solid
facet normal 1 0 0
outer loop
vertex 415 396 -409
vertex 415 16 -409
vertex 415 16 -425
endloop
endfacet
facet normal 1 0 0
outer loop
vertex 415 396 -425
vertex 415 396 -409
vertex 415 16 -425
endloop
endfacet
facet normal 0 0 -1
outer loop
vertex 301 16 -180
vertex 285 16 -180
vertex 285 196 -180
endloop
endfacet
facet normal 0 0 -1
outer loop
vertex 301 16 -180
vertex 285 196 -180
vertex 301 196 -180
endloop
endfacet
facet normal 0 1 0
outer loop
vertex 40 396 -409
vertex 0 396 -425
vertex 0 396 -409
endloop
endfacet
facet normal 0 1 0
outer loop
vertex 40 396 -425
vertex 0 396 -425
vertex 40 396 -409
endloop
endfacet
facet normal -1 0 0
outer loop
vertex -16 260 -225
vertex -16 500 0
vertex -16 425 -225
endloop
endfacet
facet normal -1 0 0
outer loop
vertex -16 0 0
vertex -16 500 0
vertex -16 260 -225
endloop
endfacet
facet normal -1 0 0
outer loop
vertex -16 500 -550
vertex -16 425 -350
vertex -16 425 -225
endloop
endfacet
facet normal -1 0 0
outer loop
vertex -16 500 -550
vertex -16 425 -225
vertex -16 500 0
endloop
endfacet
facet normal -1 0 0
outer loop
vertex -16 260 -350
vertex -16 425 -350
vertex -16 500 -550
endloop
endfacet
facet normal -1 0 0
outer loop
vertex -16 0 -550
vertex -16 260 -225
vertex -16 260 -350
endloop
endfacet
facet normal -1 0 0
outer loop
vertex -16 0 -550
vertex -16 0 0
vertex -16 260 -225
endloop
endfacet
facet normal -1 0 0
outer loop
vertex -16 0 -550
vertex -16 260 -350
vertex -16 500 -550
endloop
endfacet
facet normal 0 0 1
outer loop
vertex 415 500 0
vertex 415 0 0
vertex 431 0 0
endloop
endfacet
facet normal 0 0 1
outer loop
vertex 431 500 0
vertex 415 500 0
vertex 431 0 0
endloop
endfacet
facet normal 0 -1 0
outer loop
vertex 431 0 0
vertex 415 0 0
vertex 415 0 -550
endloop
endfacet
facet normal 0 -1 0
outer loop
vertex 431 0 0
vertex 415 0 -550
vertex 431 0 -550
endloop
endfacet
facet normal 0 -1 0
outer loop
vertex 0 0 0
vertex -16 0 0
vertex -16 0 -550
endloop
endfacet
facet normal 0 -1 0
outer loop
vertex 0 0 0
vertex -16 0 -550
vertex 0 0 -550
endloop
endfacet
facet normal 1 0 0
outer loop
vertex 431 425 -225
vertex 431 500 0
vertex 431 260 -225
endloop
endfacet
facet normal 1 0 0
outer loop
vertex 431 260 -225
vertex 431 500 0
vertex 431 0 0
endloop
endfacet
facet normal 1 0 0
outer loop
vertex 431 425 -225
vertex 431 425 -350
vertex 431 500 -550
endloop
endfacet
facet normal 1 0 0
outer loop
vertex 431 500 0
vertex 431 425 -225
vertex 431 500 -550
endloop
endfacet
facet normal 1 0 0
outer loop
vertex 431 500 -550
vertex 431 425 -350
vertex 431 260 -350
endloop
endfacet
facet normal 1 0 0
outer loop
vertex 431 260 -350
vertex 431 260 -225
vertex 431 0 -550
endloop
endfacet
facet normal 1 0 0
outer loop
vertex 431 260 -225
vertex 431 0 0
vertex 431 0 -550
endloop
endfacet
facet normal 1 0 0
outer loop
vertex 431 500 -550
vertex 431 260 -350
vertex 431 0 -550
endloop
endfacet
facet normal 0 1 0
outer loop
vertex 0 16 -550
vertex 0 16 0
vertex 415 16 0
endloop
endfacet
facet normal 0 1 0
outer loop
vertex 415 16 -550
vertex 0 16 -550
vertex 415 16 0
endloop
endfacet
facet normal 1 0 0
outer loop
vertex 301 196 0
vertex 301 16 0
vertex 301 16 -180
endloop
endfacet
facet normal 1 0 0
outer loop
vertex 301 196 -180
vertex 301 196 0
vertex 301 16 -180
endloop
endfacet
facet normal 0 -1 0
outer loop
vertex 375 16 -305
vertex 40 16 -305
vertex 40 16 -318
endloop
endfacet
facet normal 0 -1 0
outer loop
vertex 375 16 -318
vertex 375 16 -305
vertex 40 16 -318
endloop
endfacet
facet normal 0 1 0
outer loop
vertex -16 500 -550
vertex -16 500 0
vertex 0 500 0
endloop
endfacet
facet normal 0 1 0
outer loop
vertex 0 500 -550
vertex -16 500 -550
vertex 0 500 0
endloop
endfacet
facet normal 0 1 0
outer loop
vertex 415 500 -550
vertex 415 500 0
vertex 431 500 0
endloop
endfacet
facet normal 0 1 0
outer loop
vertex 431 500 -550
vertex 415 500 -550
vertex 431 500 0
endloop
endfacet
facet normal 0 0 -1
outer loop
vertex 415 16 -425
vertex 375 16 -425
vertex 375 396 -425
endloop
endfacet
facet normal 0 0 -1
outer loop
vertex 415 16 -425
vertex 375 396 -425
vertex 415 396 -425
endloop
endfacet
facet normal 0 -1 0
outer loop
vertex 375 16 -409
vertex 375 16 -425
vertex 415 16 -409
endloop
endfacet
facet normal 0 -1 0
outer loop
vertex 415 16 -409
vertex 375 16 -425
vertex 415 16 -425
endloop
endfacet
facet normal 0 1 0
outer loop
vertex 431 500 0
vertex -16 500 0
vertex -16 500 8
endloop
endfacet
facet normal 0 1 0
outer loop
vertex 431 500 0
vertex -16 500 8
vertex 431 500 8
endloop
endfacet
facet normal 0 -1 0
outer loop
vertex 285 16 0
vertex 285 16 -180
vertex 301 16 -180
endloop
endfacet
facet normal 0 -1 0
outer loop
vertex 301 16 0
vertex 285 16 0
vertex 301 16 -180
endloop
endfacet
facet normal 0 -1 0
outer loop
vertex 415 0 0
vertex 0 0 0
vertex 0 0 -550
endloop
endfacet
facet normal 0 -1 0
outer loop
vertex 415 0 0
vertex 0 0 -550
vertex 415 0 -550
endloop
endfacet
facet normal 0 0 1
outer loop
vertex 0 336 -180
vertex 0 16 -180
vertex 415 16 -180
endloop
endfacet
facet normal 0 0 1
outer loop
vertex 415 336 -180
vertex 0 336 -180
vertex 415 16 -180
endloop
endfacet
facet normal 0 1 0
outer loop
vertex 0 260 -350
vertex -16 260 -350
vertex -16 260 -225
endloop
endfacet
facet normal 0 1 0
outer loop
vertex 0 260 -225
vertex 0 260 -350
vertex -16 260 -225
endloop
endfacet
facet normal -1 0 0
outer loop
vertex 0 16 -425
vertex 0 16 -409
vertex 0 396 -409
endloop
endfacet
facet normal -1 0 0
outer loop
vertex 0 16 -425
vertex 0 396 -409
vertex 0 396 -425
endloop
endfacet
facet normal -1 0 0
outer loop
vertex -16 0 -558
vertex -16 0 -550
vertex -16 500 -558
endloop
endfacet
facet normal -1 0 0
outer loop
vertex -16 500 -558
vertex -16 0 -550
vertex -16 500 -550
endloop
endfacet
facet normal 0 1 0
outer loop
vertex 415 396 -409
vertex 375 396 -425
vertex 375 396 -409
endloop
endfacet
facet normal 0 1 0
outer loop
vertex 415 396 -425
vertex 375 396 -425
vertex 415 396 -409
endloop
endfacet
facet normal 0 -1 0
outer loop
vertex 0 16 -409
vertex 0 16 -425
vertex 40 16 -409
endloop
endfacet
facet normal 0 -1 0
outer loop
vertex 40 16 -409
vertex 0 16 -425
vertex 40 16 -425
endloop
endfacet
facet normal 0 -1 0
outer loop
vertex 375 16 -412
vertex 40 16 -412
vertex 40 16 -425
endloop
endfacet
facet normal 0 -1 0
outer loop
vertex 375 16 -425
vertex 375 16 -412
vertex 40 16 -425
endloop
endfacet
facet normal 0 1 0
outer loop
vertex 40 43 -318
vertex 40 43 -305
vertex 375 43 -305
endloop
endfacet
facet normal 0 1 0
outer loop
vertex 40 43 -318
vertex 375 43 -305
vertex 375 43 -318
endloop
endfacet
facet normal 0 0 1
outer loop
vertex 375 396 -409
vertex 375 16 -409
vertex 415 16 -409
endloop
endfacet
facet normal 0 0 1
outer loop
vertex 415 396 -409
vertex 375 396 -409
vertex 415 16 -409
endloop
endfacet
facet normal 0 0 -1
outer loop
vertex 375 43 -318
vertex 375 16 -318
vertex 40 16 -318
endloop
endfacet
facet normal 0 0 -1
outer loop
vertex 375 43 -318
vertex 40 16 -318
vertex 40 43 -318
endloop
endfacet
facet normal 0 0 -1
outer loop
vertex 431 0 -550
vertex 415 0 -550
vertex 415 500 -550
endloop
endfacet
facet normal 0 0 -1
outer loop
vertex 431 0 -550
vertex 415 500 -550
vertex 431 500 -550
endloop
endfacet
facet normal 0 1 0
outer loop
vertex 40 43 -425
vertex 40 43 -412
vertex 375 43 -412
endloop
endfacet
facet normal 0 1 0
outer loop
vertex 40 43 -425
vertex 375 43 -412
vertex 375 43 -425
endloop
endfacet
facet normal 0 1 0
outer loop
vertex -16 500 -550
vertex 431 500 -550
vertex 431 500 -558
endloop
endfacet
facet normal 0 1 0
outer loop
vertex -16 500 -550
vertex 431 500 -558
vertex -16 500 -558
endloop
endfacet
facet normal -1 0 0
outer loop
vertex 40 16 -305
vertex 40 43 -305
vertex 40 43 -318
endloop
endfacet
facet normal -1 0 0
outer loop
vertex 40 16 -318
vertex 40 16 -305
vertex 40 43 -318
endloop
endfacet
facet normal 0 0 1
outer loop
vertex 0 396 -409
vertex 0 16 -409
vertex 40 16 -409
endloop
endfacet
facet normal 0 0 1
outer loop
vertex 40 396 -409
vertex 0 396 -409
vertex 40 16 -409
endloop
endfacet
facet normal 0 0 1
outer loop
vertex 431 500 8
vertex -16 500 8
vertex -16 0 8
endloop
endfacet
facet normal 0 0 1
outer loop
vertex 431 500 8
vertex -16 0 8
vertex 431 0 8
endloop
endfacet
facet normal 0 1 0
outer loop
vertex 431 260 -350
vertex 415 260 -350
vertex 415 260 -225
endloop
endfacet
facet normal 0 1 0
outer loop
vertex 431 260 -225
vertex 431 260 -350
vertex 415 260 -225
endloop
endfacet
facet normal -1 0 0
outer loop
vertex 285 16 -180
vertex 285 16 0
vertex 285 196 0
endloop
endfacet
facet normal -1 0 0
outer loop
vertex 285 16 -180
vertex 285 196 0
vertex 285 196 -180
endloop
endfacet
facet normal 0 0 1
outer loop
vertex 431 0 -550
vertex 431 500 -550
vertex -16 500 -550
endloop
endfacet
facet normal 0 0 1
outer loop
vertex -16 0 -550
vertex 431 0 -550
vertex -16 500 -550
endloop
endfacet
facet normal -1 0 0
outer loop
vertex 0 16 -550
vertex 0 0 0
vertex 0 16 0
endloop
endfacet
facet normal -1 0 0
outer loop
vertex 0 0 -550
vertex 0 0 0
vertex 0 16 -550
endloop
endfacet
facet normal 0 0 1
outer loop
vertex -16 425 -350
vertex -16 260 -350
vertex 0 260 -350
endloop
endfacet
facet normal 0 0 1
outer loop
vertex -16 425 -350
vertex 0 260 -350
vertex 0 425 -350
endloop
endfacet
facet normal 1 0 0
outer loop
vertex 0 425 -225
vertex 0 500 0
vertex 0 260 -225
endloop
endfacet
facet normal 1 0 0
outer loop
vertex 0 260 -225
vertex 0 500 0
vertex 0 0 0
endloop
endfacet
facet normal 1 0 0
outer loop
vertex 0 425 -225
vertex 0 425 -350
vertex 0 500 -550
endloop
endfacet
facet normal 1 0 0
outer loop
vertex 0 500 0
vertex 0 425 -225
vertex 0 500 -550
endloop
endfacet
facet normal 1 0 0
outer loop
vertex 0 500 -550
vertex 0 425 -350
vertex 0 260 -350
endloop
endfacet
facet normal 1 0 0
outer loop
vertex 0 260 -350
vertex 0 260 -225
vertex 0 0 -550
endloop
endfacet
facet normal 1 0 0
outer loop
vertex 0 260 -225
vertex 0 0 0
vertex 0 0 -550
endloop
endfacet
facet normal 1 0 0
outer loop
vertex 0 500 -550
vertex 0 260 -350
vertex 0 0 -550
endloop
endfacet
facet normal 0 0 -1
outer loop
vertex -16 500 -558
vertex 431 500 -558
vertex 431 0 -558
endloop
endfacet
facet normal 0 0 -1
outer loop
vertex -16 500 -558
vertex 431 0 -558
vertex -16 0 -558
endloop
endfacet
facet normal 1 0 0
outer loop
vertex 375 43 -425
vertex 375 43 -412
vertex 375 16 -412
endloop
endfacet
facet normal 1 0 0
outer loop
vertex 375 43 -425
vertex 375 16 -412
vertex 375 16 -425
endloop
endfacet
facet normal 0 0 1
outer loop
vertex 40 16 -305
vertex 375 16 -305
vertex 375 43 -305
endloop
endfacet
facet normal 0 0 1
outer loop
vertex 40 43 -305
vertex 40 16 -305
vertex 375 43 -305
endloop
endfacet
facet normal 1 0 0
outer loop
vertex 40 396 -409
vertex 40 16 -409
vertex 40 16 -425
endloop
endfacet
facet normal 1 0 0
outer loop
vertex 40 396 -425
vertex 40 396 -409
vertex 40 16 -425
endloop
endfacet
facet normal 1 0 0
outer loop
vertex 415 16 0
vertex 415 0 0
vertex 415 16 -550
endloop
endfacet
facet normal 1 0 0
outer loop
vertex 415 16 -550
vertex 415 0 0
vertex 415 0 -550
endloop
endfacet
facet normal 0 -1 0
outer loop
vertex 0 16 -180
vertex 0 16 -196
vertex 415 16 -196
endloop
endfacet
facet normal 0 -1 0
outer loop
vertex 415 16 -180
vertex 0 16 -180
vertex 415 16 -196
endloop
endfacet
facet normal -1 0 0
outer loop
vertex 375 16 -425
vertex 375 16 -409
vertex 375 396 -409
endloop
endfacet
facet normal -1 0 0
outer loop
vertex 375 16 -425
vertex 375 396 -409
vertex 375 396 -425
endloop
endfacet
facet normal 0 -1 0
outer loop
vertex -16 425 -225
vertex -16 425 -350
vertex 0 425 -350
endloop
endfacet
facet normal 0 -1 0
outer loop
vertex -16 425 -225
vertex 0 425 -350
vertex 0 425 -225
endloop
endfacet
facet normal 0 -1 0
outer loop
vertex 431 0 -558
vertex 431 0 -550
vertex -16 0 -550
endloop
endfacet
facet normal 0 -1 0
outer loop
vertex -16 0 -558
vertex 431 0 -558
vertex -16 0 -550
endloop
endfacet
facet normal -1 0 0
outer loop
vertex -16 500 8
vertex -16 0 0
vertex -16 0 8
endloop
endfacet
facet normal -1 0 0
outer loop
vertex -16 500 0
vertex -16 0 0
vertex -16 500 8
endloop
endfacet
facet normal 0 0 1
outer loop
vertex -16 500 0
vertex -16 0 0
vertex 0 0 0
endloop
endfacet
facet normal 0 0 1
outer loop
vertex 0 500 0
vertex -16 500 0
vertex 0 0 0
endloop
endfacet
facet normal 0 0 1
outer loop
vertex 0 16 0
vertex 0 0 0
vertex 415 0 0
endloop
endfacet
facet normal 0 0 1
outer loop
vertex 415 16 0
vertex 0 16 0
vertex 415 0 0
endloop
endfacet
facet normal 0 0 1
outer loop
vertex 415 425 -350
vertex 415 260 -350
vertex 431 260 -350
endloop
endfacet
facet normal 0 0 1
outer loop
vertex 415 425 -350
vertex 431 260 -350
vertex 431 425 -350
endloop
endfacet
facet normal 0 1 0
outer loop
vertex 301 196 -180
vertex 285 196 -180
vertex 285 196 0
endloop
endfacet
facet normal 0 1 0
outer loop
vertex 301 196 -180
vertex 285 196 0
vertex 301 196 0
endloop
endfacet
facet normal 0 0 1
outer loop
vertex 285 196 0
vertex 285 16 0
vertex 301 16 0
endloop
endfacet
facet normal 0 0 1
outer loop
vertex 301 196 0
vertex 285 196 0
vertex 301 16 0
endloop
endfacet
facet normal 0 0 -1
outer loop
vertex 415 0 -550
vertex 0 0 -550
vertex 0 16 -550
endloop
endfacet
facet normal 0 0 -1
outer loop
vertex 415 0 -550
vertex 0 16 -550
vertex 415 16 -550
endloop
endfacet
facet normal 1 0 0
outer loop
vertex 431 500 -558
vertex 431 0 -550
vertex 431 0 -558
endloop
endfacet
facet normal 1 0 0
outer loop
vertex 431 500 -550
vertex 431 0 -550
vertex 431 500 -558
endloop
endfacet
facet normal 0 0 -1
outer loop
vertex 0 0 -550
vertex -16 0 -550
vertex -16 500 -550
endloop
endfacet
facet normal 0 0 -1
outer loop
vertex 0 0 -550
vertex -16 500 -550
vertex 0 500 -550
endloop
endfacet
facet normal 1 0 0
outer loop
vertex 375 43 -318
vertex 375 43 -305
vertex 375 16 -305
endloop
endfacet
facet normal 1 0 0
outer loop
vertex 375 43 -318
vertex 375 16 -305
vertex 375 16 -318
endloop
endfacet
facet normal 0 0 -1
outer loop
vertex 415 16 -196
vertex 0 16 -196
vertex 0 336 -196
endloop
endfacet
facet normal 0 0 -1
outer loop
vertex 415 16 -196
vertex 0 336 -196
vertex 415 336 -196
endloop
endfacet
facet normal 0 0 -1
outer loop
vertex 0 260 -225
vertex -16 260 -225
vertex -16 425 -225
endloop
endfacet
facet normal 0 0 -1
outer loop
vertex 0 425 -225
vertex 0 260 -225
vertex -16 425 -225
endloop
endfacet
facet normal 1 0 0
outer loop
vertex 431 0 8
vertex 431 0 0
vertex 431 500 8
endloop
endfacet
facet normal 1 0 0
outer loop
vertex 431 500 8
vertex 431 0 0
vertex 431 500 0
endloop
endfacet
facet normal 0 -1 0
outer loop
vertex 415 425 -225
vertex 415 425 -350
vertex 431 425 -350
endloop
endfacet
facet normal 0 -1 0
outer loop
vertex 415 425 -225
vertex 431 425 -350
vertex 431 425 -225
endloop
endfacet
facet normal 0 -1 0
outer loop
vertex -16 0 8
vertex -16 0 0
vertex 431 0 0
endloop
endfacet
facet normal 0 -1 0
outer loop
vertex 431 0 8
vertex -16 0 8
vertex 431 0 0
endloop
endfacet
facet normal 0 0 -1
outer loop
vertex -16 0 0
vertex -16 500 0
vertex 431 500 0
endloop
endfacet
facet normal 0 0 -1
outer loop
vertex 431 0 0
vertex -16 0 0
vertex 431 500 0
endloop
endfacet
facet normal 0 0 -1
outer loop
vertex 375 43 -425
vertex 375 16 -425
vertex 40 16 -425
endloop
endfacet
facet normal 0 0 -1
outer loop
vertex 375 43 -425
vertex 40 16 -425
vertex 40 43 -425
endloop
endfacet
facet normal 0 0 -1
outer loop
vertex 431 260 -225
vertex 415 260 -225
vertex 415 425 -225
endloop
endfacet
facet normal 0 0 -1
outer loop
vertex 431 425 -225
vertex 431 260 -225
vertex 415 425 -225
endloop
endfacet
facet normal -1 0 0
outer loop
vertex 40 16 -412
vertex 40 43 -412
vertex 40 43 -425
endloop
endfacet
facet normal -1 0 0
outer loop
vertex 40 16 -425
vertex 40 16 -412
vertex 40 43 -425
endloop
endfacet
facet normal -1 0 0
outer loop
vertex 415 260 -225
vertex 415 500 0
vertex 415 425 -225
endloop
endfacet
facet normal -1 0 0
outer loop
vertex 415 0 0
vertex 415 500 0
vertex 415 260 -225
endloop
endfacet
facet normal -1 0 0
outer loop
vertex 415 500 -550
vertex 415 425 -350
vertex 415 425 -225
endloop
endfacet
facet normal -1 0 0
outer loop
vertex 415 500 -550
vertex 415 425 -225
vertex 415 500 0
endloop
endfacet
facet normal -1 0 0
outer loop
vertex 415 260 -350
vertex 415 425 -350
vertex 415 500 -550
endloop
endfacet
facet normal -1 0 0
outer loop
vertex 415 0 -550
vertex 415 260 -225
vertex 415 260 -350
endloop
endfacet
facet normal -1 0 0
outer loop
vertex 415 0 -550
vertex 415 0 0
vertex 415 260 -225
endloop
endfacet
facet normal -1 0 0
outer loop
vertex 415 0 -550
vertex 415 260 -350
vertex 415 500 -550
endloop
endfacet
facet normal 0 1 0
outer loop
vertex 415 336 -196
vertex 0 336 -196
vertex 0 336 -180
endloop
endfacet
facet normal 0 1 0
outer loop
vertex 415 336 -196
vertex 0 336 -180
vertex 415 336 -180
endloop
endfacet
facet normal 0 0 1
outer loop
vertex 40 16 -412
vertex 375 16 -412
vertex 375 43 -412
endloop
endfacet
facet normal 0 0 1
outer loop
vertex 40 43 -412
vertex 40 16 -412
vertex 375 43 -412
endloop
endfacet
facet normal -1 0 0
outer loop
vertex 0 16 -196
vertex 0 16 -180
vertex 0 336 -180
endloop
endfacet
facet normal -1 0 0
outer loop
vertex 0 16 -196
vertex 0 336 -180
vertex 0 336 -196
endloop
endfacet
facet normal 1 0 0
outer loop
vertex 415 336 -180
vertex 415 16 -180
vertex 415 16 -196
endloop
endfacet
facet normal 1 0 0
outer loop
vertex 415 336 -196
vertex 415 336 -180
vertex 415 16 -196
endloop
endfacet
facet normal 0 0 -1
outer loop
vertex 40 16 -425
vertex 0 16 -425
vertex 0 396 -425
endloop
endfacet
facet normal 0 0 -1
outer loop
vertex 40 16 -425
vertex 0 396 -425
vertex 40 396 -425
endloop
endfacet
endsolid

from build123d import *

# Parameters (mm, degrees)
ESQUISSE1_W             = 415
ESQUISSE1_H             = 550
BOSS_EXTRU_1_DEPTH      = 16
BOSS_EXTRU_2_START      = 40
ESQUISSE2_W             = 13
ESQUISSE2_H             = 27
BOSS_EXTRU_2_DEPTH      = 335
BOSS_EXTRU_2_2_DEPTH    = 335
ESQUISSE3_W             = 16
ESQUISSE3_H             = 550
BOSS_EXTRU_3_DEPTH      = 500
BOSS_EXTRU_3_2_DEPTH    = 500
ESQUISSE4_W             = 125
ESQUISSE4_H             = 165
ENL_V_MAT_EXTRU_1_DEPTH = 868.357481088
ESQUISSE5_W             = 415
ESQUISSE5_H             = 16
BOSS_EXTRU_4_DEPTH      = 320
ESQUISSE6_W             = 447
ESQUISSE6_H             = 500
BOSS_EXTRU_5_DEPTH      = 8
ESQUISSE7_W             = 447
ESQUISSE7_H             = 500
BOSS_EXTRU_6_DEPTH      = 8
ESQUISSE9_W             = 40
ESQUISSE9_H             = 16
BOSS_EXTRU_8_DEPTH      = 380
BOSS_EXTRU_8_2_DEPTH    = 380
ESQUISSE10_W            = 16
ESQUISSE10_H            = 180
BOSS_EXTRU_9_DEPTH      = 180


with BuildPart() as part:
    # Esquisse1 → Boss.-Extru.1 (new body)
    with BuildSketch(Plane(origin=(0, 0, 0), x_dir=(1, 0, 0), z_dir=(0, 1, 0))):
        with Locations((207.5, 275)):
            Rectangle(ESQUISSE1_W, ESQUISSE1_H)
    extrude(amount=BOSS_EXTRU_1_DEPTH)


with BuildPart() as body_2:
    # Esquisse2 → Boss.-Extru.2 (new body)
    with BuildSketch(Plane(origin=(0, 0, -500), x_dir=(0, 0, -1), z_dir=(1, 0, 0)).offset(BOSS_EXTRU_2_START)):
        with Locations((-188.5, 29.5)):
            Rectangle(ESQUISSE2_W, ESQUISSE2_H)
    extrude(amount=BOSS_EXTRU_2_DEPTH)


with BuildPart() as body_3:
    # Esquisse2 → Boss.-Extru.2 2 (new body)
    with BuildSketch(Plane(origin=(0, 0, -500), x_dir=(0, 0, -1), z_dir=(1, 0, 0)).offset(BOSS_EXTRU_2_START)):
        with Locations((-81.5, 29.5)):
            Rectangle(ESQUISSE2_W, ESQUISSE2_H)
    extrude(amount=BOSS_EXTRU_2_2_DEPTH)


with BuildPart() as body_4:
    # Esquisse3 → Boss.-Extru.3 (new body)
    with BuildSketch(Plane(origin=(0, 0, 0), x_dir=(1, 0, 0), z_dir=(0, 1, 0))):
        with Locations((-8, 275)):
            Rectangle(ESQUISSE3_W, ESQUISSE3_H)
    extrude(amount=BOSS_EXTRU_3_DEPTH)


with BuildPart() as body_5:
    # Esquisse3 → Boss.-Extru.3 2 (new body)
    with BuildSketch(Plane(origin=(0, 0, 0), x_dir=(1, 0, 0), z_dir=(0, 1, 0))):
        with Locations((423, 275)):
            Rectangle(ESQUISSE3_W, ESQUISSE3_H)
    extrude(amount=BOSS_EXTRU_3_2_DEPTH)


with BuildPart() as enl_v_mat_extru_1_tool:
    # Esquisse4 → Enlèv. mat.-Extru.1 (new, through all)
    with BuildSketch(Plane.ZY.offset(16)):
        with Locations((-287.5, 342.5)):
            Rectangle(ESQUISSE4_W, ESQUISSE4_H)
    extrude(amount=-ENL_V_MAT_EXTRU_1_DEPTH)


with BuildPart() as body_4_1:
    add(body_4.part)

    # Enlèv. mat.-Extru.1: cut by enl_v_mat_extru_1_tool
    add(enl_v_mat_extru_1_tool.part, mode=Mode.SUBTRACT)


with BuildPart() as body_5_1:
    add(body_5.part)

    # Enlèv. mat.-Extru.1: cut by enl_v_mat_extru_1_tool
    add(enl_v_mat_extru_1_tool.part, mode=Mode.SUBTRACT)


with BuildPart() as body_6:
    # Esquisse5 → Boss.-Extru.4 (new body)
    with BuildSketch(Plane(origin=(0, 16, 0), x_dir=(1, 0, 0), z_dir=(0, 1, 0))):
        with Locations((207.5, 188)):
            Rectangle(ESQUISSE5_W, ESQUISSE5_H)
    extrude(amount=BOSS_EXTRU_4_DEPTH)


with BuildPart() as body_7:
    # Esquisse6 → Boss.-Extru.5 (new body)
    with BuildSketch(Plane(origin=(0, 0, -550), x_dir=(-1, 0, 0), z_dir=(0, 0, -1))):
        with Locations((-207.5, 250)):
            Rectangle(ESQUISSE6_W, ESQUISSE6_H)
    extrude(amount=BOSS_EXTRU_5_DEPTH)


with BuildPart() as body_8:
    # Esquisse7 → Boss.-Extru.6 (new body)
    with BuildSketch(Plane.XY):
        with Locations((207.5, 250)):
            Rectangle(ESQUISSE7_W, ESQUISSE7_H)
    extrude(amount=BOSS_EXTRU_6_DEPTH)


with BuildPart() as body_9:
    # Esquisse9 → Boss.-Extru.8 (new body)
    with BuildSketch(Plane(origin=(0, 16, 0), x_dir=(1, 0, 0), z_dir=(0, 1, 0))):
        with Locations((20, 417)):
            Rectangle(ESQUISSE9_W, ESQUISSE9_H)
    extrude(amount=BOSS_EXTRU_8_DEPTH)


with BuildPart() as body_10:
    # Esquisse9 → Boss.-Extru.8 2 (new body)
    with BuildSketch(Plane(origin=(0, 16, 0), x_dir=(1, 0, 0), z_dir=(0, 1, 0))):
        with Locations((395, 417)):
            Rectangle(ESQUISSE9_W, ESQUISSE9_H)
    extrude(amount=BOSS_EXTRU_8_2_DEPTH)


with BuildPart() as body_11:
    # Esquisse10 → Boss.-Extru.9 (new body)
    with BuildSketch(Plane(origin=(0, 16, 0), x_dir=(1, 0, 0), z_dir=(0, 1, 0))):
        with Locations((293, 90)):
            Rectangle(ESQUISSE10_W, ESQUISSE10_H)
    extrude(amount=BOSS_EXTRU_9_DEPTH)


solid = Compound([part.part, body_2.part, body_3.part, body_4_1.part, body_5_1.part, body_6.part, body_7.part, body_8.part, body_9.part, body_10.part, body_11.part])
